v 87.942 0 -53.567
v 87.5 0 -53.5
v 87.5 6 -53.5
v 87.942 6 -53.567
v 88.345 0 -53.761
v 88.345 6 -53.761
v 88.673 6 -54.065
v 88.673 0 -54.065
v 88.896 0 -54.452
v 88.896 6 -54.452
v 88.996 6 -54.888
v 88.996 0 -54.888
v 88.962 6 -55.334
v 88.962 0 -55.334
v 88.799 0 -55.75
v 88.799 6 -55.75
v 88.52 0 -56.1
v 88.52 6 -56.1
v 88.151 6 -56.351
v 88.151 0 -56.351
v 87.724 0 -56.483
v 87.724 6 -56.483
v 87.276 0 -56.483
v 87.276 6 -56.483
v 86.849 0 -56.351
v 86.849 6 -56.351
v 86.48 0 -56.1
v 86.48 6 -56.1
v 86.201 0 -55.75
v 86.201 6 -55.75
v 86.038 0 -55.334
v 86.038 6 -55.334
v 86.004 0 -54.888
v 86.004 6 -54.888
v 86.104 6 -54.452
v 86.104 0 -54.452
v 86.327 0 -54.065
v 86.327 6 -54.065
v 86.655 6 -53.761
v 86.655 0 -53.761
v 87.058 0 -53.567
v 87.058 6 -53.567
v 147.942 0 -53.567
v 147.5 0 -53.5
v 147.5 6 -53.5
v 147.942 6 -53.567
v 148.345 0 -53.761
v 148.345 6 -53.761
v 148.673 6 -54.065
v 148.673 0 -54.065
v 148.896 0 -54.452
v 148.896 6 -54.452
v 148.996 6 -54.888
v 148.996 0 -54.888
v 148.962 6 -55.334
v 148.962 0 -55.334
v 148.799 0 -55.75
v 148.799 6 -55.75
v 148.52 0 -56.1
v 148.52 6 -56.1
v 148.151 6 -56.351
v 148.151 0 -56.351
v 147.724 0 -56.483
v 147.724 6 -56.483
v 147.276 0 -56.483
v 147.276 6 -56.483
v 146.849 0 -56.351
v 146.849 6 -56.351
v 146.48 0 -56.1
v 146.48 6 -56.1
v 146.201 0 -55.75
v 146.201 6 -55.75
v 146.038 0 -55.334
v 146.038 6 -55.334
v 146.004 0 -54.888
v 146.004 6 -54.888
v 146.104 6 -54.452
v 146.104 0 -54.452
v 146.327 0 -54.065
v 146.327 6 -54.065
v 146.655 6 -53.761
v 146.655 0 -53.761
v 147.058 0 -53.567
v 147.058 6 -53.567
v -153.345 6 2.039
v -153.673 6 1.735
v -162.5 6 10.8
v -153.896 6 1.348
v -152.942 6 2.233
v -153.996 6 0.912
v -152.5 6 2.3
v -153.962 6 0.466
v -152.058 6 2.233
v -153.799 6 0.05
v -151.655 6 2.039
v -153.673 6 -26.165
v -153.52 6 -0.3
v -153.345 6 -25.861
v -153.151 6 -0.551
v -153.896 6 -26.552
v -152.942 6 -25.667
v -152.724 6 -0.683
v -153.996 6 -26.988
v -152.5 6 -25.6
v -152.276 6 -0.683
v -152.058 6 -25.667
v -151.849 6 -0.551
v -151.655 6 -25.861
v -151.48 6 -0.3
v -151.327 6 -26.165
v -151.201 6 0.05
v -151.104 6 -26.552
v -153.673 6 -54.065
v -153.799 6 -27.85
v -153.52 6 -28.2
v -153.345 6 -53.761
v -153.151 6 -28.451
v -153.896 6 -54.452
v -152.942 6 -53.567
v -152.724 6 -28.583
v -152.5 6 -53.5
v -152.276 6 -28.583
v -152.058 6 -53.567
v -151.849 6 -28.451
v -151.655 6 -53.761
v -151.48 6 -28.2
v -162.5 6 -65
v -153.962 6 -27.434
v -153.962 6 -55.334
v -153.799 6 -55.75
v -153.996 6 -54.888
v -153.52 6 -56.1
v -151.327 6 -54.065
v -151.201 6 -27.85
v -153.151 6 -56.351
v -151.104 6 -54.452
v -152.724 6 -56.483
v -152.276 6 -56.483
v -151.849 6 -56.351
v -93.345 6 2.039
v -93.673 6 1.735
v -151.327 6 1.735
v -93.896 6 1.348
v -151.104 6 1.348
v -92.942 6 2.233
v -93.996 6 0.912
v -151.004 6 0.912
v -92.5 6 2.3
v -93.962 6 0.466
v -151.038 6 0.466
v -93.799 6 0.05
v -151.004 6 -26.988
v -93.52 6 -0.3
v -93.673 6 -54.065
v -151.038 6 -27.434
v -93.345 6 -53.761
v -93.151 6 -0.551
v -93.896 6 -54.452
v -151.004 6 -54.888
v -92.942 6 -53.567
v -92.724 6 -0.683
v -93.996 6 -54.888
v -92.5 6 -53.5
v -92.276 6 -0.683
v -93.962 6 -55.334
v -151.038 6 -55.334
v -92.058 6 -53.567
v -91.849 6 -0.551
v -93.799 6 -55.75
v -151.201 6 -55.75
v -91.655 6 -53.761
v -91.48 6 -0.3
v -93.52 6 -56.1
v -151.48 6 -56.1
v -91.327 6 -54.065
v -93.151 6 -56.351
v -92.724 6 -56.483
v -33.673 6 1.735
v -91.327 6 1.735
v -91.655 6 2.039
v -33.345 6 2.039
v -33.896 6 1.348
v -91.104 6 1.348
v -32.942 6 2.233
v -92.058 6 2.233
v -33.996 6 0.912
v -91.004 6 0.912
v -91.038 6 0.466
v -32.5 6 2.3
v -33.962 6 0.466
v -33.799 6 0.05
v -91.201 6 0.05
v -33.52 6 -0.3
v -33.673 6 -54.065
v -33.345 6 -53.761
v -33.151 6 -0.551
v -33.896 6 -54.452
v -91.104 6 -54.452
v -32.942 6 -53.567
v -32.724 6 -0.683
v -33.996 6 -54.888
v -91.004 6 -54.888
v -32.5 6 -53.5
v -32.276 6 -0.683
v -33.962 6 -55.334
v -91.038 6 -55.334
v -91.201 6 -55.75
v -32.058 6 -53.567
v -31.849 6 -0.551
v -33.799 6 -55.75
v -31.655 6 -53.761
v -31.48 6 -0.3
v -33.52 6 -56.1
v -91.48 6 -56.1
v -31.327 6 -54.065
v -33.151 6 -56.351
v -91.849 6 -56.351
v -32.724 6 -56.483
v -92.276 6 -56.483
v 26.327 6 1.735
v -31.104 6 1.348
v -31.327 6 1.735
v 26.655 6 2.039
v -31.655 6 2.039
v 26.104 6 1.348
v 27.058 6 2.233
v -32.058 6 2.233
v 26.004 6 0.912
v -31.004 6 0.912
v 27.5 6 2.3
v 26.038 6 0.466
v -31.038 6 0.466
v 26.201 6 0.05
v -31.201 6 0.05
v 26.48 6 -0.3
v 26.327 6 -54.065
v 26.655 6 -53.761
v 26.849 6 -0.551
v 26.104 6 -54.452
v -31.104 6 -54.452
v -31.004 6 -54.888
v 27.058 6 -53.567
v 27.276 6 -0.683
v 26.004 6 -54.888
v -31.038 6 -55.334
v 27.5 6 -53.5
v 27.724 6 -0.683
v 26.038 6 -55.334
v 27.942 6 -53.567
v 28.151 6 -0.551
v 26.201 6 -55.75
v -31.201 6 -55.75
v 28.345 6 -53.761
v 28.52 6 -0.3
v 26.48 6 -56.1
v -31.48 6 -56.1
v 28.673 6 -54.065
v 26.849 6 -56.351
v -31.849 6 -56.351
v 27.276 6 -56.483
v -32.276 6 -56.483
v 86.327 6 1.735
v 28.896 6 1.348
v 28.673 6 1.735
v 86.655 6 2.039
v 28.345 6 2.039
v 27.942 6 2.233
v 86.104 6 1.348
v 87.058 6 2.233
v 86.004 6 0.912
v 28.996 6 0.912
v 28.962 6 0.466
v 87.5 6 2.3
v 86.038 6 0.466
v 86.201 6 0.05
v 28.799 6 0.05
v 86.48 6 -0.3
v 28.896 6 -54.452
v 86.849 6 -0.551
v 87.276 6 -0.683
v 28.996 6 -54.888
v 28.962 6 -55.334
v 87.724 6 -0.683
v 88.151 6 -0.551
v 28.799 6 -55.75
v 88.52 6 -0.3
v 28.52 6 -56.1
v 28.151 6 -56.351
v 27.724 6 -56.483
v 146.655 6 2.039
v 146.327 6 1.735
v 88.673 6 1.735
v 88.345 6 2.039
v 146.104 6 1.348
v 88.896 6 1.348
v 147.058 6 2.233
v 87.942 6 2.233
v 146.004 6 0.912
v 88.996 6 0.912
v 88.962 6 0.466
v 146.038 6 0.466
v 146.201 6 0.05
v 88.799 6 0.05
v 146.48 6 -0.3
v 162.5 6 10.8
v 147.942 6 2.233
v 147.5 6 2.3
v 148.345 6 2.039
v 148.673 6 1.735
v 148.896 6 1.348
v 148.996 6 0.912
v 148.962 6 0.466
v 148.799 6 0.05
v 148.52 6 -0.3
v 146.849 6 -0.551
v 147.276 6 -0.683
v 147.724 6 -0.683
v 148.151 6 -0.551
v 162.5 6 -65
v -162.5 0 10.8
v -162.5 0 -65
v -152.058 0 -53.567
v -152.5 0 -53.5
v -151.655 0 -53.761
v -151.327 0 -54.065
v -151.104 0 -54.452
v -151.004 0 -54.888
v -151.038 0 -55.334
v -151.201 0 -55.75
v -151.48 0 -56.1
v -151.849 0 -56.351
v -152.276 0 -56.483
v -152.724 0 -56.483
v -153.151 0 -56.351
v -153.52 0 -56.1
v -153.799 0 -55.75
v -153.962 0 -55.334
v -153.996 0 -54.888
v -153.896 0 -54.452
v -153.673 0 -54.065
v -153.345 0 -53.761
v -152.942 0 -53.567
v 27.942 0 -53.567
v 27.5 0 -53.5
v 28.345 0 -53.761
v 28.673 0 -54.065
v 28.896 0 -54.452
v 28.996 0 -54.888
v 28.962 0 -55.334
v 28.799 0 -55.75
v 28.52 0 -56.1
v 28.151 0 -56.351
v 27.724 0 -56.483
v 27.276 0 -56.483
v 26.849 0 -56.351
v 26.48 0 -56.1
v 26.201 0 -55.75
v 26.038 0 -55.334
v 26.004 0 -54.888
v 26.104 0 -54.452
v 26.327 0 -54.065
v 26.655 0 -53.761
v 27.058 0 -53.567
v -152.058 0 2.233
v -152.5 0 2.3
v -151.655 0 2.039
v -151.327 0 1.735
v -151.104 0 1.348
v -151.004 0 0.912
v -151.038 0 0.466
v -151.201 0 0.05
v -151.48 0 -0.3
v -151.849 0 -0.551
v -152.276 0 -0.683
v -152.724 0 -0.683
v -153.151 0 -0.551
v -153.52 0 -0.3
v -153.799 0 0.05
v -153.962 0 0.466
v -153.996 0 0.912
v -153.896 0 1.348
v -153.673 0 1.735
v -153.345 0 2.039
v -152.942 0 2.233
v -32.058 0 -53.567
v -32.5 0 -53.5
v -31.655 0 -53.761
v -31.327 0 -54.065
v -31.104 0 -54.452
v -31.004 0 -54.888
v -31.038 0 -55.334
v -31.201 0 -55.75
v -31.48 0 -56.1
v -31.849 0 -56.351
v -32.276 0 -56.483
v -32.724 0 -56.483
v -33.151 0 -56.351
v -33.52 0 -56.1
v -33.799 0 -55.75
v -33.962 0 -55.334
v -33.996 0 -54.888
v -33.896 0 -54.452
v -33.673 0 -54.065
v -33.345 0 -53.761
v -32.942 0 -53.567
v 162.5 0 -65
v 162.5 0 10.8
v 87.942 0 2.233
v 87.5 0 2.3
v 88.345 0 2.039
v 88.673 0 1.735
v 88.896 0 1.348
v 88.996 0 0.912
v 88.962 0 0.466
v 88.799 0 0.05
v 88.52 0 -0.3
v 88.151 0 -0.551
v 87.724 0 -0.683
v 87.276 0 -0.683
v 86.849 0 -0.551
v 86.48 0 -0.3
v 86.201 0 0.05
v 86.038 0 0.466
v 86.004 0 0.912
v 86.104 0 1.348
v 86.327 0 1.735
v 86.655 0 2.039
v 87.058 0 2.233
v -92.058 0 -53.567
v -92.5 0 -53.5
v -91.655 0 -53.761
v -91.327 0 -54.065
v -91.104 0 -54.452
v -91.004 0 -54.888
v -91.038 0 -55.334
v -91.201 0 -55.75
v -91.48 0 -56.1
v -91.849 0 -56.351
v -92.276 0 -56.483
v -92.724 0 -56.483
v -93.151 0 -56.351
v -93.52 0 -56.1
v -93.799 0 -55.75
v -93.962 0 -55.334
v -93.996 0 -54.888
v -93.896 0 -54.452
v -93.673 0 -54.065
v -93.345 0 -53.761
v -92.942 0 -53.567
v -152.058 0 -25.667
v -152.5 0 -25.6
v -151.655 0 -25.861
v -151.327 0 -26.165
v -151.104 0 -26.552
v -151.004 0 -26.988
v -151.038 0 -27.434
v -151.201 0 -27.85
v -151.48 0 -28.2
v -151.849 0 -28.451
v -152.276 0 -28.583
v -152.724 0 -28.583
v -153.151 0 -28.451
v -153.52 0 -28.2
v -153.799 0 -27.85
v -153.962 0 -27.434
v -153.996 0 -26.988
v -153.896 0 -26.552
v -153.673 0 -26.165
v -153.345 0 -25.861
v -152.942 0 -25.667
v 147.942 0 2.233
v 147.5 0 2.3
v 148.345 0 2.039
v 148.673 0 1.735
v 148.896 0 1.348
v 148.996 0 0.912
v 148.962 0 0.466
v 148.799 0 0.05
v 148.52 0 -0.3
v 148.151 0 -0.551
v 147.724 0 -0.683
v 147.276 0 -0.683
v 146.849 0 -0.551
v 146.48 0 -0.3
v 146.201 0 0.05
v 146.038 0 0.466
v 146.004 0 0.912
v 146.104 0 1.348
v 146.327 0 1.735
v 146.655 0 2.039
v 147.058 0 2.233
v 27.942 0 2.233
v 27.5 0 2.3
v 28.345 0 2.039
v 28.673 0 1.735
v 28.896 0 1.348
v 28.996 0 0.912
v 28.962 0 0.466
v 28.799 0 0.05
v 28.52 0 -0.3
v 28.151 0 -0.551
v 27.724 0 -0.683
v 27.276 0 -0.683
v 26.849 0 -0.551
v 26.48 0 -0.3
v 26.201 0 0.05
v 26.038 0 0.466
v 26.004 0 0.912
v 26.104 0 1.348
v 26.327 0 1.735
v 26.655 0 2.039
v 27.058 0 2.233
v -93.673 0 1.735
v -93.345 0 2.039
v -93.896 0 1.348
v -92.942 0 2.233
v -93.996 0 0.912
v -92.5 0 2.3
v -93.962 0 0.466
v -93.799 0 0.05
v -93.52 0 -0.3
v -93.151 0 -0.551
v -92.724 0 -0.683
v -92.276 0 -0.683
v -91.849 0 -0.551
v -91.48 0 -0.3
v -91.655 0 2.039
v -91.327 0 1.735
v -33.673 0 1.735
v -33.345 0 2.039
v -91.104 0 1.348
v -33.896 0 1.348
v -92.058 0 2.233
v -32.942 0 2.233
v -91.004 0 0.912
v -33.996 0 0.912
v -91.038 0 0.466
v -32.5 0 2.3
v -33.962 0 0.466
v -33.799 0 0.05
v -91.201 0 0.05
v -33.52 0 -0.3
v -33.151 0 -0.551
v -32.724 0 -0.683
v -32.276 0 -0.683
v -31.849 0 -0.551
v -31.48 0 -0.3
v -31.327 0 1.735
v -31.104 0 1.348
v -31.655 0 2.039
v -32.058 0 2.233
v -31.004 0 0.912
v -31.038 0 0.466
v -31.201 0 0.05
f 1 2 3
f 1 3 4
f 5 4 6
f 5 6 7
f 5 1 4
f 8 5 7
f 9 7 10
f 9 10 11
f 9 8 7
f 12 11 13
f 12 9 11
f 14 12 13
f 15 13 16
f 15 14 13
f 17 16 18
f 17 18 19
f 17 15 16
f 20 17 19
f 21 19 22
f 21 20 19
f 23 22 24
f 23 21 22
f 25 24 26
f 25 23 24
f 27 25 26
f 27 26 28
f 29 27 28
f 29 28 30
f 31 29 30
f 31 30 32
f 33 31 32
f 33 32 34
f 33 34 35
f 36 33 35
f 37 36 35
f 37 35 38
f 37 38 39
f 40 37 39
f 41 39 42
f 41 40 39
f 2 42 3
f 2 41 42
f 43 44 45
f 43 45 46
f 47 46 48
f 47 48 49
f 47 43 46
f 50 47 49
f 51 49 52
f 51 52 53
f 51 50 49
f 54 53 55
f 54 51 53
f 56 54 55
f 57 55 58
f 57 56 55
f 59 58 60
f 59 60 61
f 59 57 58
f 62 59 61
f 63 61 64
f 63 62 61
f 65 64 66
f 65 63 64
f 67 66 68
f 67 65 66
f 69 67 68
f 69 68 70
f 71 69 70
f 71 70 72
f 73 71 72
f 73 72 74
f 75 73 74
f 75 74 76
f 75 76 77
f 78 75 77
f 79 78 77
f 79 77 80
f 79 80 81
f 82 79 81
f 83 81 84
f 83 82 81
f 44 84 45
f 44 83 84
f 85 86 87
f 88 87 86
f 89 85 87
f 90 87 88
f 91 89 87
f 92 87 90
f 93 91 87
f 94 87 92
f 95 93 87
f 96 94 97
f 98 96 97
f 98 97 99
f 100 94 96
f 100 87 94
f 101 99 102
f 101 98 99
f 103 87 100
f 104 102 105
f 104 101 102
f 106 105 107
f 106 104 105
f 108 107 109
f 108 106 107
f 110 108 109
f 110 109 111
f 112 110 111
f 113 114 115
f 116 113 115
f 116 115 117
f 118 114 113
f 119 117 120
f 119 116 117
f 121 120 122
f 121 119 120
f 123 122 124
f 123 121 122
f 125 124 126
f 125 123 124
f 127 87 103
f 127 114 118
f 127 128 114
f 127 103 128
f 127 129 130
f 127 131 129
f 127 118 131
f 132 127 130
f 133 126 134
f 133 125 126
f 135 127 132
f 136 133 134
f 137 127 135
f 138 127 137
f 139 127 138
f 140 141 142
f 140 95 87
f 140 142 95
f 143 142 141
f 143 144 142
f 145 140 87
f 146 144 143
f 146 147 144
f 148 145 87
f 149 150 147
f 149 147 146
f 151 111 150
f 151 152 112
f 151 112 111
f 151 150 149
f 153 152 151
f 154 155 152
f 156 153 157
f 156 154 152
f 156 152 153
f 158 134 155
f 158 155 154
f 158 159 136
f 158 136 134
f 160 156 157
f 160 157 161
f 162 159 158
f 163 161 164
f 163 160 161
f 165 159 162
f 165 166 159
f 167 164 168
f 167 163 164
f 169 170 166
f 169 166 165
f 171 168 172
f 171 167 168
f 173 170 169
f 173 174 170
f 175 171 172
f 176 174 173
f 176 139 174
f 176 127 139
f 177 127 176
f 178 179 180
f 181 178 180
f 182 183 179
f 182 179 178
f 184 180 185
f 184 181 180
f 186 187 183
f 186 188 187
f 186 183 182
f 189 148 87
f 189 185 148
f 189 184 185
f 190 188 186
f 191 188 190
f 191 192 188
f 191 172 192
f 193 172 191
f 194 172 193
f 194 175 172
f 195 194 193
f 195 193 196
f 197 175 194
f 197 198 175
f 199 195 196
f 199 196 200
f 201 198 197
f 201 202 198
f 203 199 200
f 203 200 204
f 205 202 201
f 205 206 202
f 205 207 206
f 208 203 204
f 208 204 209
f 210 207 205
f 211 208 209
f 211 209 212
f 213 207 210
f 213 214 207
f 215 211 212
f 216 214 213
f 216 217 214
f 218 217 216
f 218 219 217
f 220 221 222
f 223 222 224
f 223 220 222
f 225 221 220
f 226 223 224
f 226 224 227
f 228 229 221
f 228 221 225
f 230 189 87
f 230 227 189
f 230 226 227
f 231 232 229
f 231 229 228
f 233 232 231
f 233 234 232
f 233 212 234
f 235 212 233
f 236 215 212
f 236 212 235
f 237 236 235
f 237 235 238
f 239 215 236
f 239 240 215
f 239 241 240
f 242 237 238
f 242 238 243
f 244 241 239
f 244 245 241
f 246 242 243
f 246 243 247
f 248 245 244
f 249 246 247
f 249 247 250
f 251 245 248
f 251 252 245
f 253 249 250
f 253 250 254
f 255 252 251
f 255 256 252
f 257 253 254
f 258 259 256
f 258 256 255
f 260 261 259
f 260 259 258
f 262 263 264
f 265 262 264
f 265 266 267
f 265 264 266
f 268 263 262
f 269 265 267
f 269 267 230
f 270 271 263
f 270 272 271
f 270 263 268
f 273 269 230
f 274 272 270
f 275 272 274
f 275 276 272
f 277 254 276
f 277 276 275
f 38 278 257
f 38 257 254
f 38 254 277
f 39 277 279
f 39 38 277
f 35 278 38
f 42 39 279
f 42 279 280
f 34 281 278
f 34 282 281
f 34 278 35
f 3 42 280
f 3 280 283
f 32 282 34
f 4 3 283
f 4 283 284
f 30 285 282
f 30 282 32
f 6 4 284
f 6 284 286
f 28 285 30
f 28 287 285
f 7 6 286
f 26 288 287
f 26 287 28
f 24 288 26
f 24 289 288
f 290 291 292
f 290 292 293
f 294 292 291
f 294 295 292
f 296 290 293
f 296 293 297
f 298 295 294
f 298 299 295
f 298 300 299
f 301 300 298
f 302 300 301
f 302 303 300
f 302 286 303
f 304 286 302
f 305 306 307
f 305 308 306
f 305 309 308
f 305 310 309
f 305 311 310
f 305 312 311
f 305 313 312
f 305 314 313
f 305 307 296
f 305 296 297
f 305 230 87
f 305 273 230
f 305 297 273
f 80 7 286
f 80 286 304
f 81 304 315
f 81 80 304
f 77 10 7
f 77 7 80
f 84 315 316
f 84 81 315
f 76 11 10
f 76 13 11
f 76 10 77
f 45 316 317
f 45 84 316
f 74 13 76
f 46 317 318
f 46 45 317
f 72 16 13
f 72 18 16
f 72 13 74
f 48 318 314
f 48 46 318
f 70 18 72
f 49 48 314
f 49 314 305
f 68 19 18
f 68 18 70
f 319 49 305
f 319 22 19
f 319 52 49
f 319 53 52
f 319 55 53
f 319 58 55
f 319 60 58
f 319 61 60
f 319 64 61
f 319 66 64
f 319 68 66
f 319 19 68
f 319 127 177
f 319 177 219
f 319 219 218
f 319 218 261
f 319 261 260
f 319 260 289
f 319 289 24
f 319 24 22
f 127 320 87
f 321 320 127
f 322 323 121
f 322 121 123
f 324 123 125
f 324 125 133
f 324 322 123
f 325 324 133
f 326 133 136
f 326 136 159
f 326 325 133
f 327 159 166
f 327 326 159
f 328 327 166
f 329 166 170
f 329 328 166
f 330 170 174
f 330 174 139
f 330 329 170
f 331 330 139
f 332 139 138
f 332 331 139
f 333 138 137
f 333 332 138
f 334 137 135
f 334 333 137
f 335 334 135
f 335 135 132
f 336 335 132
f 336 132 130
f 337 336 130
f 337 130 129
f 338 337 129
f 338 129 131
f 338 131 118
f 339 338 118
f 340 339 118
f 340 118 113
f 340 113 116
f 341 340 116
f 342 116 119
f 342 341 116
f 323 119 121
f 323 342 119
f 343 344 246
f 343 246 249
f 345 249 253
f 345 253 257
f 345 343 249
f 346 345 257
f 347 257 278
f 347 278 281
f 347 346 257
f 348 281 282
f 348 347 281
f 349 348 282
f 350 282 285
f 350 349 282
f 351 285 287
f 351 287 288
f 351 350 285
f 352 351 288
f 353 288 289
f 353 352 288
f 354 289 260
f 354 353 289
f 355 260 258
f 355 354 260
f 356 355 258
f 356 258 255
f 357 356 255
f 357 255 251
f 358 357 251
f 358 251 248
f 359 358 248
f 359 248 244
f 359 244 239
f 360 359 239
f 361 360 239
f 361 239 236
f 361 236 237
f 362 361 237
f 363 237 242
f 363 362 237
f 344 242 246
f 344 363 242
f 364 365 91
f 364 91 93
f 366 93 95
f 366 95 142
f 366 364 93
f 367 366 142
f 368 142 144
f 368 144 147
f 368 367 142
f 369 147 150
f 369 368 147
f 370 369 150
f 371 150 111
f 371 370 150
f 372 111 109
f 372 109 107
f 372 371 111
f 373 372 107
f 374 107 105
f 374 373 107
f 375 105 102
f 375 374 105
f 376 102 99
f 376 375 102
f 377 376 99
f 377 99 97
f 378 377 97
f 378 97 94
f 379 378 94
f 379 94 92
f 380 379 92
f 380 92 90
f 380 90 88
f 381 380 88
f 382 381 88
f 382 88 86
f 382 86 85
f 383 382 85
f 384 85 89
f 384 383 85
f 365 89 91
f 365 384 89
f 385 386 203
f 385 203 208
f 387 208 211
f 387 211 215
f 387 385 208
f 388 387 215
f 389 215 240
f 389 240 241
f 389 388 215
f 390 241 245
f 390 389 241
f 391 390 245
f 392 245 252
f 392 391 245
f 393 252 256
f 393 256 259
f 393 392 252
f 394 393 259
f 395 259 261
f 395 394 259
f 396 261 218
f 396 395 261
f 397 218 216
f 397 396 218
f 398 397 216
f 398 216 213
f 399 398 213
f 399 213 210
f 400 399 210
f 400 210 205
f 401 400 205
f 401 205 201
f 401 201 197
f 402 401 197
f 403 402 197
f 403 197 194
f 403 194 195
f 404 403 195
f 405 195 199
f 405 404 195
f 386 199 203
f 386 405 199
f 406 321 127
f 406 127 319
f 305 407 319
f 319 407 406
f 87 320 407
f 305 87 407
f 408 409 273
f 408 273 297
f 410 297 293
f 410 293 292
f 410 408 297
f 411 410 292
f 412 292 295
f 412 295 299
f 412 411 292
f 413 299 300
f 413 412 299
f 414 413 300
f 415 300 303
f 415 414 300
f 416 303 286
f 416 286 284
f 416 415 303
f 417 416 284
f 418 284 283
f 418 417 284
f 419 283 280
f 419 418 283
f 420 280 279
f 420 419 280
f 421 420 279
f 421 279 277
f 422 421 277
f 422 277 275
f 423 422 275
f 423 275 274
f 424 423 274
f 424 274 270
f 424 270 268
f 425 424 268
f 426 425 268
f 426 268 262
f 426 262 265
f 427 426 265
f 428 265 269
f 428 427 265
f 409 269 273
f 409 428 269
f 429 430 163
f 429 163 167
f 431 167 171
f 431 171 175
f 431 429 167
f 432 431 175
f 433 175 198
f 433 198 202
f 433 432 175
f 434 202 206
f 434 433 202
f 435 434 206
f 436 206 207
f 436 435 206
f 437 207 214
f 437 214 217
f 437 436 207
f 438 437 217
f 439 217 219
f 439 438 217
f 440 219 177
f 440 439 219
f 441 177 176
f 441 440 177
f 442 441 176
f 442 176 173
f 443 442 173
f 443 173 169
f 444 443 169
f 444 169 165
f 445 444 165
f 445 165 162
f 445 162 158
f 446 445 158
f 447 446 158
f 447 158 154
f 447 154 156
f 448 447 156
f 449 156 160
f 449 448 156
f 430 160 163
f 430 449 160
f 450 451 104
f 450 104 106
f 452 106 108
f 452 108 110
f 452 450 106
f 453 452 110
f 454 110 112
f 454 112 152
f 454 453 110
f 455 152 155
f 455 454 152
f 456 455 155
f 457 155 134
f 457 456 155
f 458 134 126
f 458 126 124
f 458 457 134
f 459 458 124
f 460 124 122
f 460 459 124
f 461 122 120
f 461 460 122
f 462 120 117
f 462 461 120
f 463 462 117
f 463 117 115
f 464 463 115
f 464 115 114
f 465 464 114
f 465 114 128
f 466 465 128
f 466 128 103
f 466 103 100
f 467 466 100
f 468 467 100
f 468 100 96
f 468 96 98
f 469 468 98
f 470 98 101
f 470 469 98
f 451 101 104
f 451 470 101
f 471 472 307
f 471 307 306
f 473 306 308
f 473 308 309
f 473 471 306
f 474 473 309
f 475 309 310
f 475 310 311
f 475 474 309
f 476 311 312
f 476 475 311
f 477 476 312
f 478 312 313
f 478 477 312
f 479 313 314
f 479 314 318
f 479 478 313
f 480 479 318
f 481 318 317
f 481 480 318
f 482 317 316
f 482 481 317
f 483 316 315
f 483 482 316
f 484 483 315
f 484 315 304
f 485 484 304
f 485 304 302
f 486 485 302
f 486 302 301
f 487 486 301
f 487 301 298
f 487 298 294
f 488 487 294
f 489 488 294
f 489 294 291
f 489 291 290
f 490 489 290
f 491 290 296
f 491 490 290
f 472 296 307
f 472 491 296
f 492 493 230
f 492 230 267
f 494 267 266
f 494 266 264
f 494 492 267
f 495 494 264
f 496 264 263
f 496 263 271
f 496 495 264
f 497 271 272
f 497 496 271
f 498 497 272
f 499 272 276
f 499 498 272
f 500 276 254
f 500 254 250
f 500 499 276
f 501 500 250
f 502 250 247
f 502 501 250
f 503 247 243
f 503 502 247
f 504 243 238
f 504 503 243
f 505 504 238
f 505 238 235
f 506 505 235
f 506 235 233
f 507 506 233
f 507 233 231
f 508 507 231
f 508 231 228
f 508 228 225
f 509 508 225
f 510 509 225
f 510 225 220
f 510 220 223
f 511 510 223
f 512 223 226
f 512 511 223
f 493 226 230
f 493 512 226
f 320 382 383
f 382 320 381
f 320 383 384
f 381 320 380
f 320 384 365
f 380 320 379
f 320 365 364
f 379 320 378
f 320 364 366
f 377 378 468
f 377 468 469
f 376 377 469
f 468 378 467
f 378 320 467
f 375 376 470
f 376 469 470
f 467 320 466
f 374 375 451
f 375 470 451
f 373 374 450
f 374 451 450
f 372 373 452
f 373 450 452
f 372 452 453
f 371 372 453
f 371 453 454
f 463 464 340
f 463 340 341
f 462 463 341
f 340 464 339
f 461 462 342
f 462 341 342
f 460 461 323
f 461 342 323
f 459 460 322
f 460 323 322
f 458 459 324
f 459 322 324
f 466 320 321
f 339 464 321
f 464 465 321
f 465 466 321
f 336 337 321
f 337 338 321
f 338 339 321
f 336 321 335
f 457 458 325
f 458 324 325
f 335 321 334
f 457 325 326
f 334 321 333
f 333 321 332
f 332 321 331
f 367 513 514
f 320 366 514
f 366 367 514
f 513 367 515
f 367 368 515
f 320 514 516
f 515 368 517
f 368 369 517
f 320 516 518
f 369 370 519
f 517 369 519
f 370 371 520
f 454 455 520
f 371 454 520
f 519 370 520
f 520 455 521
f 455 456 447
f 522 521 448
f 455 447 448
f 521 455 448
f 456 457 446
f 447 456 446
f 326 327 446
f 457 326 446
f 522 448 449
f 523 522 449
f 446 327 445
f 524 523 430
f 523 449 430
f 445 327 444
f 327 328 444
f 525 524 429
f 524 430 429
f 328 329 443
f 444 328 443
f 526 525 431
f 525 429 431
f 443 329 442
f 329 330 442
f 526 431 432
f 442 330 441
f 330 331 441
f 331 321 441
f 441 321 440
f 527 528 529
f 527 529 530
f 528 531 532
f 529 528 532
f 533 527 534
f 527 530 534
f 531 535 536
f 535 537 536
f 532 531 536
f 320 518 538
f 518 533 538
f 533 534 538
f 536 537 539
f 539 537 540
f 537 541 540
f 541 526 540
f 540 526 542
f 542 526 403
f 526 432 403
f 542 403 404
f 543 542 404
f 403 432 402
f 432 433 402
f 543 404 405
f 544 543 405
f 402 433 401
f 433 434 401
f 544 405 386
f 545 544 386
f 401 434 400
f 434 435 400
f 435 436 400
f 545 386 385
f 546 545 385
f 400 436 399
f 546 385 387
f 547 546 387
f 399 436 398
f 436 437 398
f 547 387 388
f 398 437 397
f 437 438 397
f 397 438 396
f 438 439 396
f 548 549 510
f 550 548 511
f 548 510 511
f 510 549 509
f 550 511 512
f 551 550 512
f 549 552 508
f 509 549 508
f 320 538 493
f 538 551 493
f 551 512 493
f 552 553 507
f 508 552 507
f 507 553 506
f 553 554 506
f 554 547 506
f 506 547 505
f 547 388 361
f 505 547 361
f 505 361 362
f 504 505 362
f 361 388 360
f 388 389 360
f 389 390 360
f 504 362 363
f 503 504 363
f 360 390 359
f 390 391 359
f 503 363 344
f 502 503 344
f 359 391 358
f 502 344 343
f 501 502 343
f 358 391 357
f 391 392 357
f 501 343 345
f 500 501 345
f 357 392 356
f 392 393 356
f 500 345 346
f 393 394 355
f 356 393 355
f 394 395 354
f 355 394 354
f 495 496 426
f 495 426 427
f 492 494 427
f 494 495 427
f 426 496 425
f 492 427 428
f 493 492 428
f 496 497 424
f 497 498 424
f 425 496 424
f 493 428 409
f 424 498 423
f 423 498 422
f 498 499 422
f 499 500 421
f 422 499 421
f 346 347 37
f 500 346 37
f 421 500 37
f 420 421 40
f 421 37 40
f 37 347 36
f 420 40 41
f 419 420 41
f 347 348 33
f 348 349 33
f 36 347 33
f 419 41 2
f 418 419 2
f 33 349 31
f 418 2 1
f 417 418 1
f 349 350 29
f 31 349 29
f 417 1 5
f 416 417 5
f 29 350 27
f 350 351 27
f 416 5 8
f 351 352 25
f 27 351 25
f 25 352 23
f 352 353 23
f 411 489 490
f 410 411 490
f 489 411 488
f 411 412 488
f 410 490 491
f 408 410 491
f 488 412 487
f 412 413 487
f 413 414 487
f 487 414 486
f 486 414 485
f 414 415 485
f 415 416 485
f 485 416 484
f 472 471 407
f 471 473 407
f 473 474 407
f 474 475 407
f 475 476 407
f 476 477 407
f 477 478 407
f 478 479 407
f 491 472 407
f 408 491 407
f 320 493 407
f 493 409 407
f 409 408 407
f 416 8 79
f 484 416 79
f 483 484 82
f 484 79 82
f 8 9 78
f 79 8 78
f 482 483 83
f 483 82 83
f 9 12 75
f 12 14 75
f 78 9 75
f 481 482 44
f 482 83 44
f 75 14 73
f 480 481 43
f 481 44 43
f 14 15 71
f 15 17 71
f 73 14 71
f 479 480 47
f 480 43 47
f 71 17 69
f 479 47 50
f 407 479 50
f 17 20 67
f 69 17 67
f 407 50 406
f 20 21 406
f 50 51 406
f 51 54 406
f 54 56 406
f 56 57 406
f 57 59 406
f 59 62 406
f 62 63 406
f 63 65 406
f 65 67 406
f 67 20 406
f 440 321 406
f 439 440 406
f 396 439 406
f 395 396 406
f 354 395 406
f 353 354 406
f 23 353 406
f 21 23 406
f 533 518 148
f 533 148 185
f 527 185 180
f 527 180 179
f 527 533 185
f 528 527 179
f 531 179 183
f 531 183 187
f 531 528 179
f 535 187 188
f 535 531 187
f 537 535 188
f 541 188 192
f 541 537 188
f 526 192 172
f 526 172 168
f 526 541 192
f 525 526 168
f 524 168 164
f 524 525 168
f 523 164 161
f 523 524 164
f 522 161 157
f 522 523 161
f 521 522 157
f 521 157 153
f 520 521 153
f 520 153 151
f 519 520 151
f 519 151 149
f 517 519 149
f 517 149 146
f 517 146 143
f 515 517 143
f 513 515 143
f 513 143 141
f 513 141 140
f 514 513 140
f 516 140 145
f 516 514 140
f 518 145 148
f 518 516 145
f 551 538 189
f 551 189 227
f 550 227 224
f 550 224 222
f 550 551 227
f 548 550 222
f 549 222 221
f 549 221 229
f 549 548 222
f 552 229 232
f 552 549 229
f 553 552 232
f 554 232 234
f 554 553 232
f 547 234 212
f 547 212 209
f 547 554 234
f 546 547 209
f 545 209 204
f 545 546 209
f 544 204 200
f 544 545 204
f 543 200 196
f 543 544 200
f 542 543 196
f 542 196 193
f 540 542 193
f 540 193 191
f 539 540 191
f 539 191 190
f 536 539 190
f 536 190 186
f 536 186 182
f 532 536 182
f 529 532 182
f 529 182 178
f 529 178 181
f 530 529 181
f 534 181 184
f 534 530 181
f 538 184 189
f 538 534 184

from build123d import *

# Parameters (mm, degrees)
SKETCH_1_W      = 325
SKETCH_1_H      = 75.8
SKETCH_1_R      = 1.5
EXTRUDE_1_DEPTH = 6


with BuildPart() as part:
    # 草图1 → 凸台-拉伸1 (new body)
    with BuildSketch(Plane(origin=(0, 0, 0), x_dir=(1, 0, 0), z_dir=(0, 1, 0))):
        with Locations((0, 27.1)):
            Rectangle(SKETCH_1_W, SKETCH_1_H)
        with Locations(Location((-152.5, 55, 0), (0, 0, 270))):
            Circle(SKETCH_1_R, mode=Mode.SUBTRACT)
        with Locations(Location((-152.5, -0.8, 0), (0, 0, 270))):
            Circle(SKETCH_1_R, mode=Mode.SUBTRACT)
        with Locations(Location((-92.5, 55, 0), (0, 0, 270))):
            Circle(SKETCH_1_R, mode=Mode.SUBTRACT)
        with Locations(Location((-32.5, 55, 0), (0, 0, 270))):
            Circle(SKETCH_1_R, mode=Mode.SUBTRACT)
        with Locations(Location((27.5, 55, 0), (0, 0, 270))):
            Circle(SKETCH_1_R, mode=Mode.SUBTRACT)
        with Locations(Location((87.5, 55, 0), (0, 0, 270))):
            Circle(SKETCH_1_R, mode=Mode.SUBTRACT)
        with Locations(Location((147.5, 55, 0), (0, 0, 270))):
            Circle(SKETCH_1_R, mode=Mode.SUBTRACT)
        with Locations(Location((-92.5, -0.8, 0), (0, 0, 270))):
            Circle(SKETCH_1_R, mode=Mode.SUBTRACT)
        with Locations(Location((-32.5, -0.8, 0), (0, 0, 270))):
            Circle(SKETCH_1_R, mode=Mode.SUBTRACT)
        with Locations(Location((27.5, -0.8, 0), (0, 0, 270))):
            Circle(SKETCH_1_R, mode=Mode.SUBTRACT)
        with Locations(Location((87.5, -0.8, 0), (0, 0, 270))):
            Circle(SKETCH_1_R, mode=Mode.SUBTRACT)
        with Locations(Location((147.5, -0.8, 0), (0, 0, 270))):
            Circle(SKETCH_1_R, mode=Mode.SUBTRACT)
        with Locations(Location((-152.5, 27.1, 0), (0, 0, 270))):
            Circle(SKETCH_1_R, mode=Mode.SUBTRACT)
    extrude(amount=EXTRUDE_1_DEPTH)


solid = part.part
